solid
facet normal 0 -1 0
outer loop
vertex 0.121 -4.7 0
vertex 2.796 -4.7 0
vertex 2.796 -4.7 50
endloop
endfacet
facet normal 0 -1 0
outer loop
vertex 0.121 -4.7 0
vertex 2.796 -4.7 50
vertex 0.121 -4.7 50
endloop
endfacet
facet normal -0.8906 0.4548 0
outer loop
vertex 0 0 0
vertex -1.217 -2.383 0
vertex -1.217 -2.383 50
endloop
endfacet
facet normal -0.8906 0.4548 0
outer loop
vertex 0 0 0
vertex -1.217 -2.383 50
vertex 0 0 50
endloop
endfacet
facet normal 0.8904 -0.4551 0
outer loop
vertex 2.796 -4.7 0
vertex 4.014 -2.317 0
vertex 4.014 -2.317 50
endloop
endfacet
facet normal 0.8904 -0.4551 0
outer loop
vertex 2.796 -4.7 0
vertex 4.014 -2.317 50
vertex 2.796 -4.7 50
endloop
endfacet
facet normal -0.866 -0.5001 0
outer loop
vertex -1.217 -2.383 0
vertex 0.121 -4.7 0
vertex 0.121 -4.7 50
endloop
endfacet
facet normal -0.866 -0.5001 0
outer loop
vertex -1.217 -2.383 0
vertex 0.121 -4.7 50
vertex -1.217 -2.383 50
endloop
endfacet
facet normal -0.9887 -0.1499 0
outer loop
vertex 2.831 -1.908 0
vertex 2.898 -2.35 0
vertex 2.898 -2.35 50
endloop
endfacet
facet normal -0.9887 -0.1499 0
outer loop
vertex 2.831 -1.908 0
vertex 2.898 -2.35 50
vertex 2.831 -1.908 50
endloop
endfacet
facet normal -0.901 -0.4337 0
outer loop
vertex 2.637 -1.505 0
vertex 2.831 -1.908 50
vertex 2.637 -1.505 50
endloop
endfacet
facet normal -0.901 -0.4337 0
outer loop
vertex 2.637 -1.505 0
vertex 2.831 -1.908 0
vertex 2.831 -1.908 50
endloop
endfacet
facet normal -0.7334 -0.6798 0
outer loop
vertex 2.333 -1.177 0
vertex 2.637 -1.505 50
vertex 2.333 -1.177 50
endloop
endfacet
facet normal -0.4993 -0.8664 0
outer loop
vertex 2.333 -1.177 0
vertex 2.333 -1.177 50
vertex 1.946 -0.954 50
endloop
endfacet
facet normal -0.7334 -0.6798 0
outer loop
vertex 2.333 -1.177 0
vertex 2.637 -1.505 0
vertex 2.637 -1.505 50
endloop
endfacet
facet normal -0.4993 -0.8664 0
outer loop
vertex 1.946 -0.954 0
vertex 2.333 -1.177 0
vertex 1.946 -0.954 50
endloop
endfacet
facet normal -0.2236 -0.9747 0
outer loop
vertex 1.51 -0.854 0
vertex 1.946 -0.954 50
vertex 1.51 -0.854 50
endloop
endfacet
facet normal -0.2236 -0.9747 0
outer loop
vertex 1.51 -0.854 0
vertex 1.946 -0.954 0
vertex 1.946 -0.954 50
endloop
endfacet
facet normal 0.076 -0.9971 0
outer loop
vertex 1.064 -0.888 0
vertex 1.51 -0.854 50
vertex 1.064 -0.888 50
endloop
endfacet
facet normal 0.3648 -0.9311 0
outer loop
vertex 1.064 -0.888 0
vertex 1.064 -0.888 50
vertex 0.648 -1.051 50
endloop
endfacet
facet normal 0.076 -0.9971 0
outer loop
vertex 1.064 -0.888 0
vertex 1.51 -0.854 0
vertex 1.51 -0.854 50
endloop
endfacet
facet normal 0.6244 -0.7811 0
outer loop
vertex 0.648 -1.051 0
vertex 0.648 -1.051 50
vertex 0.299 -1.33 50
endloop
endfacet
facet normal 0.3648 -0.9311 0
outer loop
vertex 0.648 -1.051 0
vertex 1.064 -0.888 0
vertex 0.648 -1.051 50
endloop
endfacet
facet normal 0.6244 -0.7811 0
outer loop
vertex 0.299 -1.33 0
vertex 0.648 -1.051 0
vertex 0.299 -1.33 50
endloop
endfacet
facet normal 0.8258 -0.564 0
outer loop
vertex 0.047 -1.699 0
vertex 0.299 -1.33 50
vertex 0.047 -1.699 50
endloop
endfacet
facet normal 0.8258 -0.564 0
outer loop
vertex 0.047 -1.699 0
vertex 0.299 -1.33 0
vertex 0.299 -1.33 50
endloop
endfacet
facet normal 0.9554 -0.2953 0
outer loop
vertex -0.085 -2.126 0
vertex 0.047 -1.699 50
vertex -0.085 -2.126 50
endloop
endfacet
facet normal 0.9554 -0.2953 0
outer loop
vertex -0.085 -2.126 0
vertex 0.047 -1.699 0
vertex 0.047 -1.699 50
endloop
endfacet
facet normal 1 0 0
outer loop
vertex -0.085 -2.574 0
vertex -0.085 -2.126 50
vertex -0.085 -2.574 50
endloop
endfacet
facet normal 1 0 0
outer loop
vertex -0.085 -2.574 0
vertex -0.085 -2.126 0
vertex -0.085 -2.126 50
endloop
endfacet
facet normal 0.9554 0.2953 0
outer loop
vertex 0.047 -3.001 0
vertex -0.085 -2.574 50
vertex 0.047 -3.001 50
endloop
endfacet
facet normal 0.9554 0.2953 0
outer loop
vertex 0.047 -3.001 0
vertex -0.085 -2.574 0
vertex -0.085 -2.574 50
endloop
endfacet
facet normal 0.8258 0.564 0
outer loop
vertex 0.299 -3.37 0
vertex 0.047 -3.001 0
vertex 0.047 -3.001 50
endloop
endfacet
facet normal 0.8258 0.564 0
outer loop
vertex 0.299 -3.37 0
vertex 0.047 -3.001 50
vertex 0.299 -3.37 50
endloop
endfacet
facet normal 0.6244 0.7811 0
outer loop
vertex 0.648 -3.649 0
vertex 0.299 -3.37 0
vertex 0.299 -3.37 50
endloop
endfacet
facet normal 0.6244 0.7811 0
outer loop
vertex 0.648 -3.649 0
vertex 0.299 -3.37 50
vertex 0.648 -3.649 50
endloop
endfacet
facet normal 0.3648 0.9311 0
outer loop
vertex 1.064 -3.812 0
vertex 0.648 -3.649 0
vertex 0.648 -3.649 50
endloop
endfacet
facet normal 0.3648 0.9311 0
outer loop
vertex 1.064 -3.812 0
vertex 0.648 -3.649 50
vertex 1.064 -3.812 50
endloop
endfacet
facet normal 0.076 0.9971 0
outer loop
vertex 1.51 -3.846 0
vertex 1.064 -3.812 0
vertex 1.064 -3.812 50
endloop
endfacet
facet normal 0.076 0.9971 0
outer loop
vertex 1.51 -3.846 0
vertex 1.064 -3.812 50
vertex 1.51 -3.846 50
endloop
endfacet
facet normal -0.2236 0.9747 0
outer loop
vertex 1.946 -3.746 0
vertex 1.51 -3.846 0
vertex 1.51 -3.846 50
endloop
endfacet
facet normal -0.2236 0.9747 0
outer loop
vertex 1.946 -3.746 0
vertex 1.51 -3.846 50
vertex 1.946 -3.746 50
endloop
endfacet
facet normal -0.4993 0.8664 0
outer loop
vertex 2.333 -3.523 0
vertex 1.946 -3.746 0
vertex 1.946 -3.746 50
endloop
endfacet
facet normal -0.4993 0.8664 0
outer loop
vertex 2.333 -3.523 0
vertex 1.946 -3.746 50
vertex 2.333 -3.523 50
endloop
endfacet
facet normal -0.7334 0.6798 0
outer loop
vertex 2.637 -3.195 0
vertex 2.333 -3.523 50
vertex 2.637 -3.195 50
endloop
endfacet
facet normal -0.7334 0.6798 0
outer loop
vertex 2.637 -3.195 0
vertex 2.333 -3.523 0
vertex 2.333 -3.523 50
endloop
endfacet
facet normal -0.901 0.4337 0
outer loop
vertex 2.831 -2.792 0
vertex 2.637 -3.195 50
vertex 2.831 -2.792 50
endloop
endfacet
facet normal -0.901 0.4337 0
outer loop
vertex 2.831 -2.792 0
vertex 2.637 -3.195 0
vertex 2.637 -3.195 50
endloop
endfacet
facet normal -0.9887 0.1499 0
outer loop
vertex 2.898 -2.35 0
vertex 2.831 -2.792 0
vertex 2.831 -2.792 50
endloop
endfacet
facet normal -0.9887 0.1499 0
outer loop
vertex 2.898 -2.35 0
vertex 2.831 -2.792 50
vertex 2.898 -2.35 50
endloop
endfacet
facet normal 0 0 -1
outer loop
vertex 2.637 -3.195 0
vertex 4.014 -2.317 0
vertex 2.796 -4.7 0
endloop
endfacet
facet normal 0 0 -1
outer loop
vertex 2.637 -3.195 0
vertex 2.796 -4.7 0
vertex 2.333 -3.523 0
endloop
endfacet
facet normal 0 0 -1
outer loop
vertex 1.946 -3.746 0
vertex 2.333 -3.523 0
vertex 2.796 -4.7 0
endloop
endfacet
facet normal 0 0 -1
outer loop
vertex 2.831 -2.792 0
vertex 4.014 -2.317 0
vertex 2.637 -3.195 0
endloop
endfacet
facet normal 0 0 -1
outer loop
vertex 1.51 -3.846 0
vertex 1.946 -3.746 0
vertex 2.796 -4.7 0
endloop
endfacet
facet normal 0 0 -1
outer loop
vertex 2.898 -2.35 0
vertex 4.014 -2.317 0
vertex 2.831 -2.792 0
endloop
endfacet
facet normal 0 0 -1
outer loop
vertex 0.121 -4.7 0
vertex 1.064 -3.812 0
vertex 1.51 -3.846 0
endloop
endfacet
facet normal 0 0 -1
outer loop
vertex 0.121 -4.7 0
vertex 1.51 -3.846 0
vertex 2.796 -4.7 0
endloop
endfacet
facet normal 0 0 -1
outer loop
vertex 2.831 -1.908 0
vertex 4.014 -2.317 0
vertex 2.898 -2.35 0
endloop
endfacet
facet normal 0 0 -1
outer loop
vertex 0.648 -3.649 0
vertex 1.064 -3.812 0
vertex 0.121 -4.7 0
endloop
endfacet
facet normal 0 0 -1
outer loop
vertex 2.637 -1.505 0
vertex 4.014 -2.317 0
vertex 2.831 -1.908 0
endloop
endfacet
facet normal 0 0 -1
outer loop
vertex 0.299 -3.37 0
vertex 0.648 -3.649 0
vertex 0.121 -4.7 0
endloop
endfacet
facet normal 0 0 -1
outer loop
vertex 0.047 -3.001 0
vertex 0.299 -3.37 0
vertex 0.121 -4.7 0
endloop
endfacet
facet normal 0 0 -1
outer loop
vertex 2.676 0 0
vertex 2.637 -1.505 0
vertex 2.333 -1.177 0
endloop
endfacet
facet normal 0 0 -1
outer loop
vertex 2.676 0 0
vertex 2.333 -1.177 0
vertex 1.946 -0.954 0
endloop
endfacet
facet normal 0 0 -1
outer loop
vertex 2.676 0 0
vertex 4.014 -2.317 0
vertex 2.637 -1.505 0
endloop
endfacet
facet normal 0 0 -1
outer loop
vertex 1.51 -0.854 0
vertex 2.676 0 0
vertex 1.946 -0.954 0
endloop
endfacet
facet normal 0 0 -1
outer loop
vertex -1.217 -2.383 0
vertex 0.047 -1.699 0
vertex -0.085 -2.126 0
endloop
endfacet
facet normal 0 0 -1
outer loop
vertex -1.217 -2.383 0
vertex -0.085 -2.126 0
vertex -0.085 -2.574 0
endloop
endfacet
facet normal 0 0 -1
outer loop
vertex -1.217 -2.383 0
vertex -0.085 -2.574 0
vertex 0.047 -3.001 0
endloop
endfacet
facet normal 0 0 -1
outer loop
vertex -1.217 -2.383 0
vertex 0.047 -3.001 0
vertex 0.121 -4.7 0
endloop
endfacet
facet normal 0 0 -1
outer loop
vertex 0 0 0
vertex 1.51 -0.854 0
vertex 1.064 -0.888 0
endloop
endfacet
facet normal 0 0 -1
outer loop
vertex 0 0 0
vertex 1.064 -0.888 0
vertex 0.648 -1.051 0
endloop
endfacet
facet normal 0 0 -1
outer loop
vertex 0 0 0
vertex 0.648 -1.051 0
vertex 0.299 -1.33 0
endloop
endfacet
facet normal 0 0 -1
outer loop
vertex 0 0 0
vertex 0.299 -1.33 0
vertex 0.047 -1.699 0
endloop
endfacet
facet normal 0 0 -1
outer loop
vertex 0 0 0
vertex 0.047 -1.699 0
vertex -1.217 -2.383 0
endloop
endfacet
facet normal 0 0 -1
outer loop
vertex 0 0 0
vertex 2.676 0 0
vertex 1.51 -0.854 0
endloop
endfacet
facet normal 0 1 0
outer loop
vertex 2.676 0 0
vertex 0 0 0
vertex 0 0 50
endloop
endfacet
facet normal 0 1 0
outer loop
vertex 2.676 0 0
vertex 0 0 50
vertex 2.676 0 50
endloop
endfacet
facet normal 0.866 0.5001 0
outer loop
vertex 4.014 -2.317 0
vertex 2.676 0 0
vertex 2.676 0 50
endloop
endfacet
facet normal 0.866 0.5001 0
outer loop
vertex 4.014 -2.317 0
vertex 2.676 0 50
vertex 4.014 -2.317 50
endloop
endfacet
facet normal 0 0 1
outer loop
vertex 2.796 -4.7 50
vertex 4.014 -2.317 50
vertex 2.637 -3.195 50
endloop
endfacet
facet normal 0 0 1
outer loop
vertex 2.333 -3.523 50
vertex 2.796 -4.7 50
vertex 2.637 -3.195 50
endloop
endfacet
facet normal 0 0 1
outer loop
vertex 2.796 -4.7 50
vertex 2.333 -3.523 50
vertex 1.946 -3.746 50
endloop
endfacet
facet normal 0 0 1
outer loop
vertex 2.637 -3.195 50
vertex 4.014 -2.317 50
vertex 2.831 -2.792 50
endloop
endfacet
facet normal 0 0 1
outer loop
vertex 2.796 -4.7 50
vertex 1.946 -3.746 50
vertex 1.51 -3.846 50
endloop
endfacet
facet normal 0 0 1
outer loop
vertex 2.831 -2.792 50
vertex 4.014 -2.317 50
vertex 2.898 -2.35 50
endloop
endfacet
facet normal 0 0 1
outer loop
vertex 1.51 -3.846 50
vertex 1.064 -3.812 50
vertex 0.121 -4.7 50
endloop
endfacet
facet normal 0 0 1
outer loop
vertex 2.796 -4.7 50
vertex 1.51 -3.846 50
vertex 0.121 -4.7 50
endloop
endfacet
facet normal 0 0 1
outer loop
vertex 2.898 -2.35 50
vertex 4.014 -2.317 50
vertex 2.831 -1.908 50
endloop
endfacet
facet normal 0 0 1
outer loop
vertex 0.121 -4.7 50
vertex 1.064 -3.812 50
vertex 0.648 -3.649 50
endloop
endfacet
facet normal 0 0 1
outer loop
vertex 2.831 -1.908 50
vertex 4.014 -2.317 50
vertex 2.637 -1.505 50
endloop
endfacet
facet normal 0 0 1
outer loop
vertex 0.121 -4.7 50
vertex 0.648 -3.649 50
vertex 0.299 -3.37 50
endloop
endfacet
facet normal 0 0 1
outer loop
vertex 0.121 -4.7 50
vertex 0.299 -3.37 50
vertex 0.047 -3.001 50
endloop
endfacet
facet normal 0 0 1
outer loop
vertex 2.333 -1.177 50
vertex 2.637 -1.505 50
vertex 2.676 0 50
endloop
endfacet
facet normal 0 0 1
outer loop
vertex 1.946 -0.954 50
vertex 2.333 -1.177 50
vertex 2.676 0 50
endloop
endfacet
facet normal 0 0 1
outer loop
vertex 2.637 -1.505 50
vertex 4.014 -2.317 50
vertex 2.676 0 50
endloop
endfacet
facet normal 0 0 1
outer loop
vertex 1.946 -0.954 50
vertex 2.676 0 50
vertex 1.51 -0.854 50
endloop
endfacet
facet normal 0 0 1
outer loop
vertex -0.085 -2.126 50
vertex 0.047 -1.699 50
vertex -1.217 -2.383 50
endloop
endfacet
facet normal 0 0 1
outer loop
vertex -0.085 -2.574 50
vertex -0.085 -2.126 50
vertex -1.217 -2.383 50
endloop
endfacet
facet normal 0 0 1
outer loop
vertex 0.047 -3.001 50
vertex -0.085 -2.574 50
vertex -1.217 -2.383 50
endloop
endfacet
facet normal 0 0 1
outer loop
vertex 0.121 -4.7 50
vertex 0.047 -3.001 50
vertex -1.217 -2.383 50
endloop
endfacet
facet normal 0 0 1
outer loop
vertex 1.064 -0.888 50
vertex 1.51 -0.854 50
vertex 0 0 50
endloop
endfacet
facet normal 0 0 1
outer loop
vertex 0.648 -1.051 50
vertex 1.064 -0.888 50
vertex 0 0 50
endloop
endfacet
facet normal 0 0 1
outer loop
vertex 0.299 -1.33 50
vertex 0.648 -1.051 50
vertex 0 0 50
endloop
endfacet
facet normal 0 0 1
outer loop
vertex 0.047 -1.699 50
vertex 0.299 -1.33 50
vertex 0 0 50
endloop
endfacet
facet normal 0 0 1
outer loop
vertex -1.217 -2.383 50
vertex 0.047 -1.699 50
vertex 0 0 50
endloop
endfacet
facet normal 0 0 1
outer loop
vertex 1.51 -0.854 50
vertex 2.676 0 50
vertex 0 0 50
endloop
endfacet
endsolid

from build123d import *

# Parameters (mm, degrees)
EXTRUDE_1_DEPTH     = 50
SKETCH_2_R          = 1.5
CUT_EXTRUDE_1_DEPTH = 50


with BuildPart() as part:
    # 草图1 → 凸台-拉伸1 (new body)
    with BuildSketch(Plane.XY):
        Polygon((0, 0), (2.675718911, 0), (4.013578367, -2.317240551), (2.796233264, -4.7), (0.120514353, -4.7), (-1.217345103, -2.382759449), align=None)
    extrude(amount=EXTRUDE_1_DEPTH)

    # 草图2 → 切除-拉伸1 (cut)
    with BuildSketch(Plane.XY):
        with Locations((1.398116632, -2.35)):
            Circle(SKETCH_2_R)
    extrude(amount=CUT_EXTRUDE_1_DEPTH, mode=Mode.SUBTRACT)


solid = part.part
